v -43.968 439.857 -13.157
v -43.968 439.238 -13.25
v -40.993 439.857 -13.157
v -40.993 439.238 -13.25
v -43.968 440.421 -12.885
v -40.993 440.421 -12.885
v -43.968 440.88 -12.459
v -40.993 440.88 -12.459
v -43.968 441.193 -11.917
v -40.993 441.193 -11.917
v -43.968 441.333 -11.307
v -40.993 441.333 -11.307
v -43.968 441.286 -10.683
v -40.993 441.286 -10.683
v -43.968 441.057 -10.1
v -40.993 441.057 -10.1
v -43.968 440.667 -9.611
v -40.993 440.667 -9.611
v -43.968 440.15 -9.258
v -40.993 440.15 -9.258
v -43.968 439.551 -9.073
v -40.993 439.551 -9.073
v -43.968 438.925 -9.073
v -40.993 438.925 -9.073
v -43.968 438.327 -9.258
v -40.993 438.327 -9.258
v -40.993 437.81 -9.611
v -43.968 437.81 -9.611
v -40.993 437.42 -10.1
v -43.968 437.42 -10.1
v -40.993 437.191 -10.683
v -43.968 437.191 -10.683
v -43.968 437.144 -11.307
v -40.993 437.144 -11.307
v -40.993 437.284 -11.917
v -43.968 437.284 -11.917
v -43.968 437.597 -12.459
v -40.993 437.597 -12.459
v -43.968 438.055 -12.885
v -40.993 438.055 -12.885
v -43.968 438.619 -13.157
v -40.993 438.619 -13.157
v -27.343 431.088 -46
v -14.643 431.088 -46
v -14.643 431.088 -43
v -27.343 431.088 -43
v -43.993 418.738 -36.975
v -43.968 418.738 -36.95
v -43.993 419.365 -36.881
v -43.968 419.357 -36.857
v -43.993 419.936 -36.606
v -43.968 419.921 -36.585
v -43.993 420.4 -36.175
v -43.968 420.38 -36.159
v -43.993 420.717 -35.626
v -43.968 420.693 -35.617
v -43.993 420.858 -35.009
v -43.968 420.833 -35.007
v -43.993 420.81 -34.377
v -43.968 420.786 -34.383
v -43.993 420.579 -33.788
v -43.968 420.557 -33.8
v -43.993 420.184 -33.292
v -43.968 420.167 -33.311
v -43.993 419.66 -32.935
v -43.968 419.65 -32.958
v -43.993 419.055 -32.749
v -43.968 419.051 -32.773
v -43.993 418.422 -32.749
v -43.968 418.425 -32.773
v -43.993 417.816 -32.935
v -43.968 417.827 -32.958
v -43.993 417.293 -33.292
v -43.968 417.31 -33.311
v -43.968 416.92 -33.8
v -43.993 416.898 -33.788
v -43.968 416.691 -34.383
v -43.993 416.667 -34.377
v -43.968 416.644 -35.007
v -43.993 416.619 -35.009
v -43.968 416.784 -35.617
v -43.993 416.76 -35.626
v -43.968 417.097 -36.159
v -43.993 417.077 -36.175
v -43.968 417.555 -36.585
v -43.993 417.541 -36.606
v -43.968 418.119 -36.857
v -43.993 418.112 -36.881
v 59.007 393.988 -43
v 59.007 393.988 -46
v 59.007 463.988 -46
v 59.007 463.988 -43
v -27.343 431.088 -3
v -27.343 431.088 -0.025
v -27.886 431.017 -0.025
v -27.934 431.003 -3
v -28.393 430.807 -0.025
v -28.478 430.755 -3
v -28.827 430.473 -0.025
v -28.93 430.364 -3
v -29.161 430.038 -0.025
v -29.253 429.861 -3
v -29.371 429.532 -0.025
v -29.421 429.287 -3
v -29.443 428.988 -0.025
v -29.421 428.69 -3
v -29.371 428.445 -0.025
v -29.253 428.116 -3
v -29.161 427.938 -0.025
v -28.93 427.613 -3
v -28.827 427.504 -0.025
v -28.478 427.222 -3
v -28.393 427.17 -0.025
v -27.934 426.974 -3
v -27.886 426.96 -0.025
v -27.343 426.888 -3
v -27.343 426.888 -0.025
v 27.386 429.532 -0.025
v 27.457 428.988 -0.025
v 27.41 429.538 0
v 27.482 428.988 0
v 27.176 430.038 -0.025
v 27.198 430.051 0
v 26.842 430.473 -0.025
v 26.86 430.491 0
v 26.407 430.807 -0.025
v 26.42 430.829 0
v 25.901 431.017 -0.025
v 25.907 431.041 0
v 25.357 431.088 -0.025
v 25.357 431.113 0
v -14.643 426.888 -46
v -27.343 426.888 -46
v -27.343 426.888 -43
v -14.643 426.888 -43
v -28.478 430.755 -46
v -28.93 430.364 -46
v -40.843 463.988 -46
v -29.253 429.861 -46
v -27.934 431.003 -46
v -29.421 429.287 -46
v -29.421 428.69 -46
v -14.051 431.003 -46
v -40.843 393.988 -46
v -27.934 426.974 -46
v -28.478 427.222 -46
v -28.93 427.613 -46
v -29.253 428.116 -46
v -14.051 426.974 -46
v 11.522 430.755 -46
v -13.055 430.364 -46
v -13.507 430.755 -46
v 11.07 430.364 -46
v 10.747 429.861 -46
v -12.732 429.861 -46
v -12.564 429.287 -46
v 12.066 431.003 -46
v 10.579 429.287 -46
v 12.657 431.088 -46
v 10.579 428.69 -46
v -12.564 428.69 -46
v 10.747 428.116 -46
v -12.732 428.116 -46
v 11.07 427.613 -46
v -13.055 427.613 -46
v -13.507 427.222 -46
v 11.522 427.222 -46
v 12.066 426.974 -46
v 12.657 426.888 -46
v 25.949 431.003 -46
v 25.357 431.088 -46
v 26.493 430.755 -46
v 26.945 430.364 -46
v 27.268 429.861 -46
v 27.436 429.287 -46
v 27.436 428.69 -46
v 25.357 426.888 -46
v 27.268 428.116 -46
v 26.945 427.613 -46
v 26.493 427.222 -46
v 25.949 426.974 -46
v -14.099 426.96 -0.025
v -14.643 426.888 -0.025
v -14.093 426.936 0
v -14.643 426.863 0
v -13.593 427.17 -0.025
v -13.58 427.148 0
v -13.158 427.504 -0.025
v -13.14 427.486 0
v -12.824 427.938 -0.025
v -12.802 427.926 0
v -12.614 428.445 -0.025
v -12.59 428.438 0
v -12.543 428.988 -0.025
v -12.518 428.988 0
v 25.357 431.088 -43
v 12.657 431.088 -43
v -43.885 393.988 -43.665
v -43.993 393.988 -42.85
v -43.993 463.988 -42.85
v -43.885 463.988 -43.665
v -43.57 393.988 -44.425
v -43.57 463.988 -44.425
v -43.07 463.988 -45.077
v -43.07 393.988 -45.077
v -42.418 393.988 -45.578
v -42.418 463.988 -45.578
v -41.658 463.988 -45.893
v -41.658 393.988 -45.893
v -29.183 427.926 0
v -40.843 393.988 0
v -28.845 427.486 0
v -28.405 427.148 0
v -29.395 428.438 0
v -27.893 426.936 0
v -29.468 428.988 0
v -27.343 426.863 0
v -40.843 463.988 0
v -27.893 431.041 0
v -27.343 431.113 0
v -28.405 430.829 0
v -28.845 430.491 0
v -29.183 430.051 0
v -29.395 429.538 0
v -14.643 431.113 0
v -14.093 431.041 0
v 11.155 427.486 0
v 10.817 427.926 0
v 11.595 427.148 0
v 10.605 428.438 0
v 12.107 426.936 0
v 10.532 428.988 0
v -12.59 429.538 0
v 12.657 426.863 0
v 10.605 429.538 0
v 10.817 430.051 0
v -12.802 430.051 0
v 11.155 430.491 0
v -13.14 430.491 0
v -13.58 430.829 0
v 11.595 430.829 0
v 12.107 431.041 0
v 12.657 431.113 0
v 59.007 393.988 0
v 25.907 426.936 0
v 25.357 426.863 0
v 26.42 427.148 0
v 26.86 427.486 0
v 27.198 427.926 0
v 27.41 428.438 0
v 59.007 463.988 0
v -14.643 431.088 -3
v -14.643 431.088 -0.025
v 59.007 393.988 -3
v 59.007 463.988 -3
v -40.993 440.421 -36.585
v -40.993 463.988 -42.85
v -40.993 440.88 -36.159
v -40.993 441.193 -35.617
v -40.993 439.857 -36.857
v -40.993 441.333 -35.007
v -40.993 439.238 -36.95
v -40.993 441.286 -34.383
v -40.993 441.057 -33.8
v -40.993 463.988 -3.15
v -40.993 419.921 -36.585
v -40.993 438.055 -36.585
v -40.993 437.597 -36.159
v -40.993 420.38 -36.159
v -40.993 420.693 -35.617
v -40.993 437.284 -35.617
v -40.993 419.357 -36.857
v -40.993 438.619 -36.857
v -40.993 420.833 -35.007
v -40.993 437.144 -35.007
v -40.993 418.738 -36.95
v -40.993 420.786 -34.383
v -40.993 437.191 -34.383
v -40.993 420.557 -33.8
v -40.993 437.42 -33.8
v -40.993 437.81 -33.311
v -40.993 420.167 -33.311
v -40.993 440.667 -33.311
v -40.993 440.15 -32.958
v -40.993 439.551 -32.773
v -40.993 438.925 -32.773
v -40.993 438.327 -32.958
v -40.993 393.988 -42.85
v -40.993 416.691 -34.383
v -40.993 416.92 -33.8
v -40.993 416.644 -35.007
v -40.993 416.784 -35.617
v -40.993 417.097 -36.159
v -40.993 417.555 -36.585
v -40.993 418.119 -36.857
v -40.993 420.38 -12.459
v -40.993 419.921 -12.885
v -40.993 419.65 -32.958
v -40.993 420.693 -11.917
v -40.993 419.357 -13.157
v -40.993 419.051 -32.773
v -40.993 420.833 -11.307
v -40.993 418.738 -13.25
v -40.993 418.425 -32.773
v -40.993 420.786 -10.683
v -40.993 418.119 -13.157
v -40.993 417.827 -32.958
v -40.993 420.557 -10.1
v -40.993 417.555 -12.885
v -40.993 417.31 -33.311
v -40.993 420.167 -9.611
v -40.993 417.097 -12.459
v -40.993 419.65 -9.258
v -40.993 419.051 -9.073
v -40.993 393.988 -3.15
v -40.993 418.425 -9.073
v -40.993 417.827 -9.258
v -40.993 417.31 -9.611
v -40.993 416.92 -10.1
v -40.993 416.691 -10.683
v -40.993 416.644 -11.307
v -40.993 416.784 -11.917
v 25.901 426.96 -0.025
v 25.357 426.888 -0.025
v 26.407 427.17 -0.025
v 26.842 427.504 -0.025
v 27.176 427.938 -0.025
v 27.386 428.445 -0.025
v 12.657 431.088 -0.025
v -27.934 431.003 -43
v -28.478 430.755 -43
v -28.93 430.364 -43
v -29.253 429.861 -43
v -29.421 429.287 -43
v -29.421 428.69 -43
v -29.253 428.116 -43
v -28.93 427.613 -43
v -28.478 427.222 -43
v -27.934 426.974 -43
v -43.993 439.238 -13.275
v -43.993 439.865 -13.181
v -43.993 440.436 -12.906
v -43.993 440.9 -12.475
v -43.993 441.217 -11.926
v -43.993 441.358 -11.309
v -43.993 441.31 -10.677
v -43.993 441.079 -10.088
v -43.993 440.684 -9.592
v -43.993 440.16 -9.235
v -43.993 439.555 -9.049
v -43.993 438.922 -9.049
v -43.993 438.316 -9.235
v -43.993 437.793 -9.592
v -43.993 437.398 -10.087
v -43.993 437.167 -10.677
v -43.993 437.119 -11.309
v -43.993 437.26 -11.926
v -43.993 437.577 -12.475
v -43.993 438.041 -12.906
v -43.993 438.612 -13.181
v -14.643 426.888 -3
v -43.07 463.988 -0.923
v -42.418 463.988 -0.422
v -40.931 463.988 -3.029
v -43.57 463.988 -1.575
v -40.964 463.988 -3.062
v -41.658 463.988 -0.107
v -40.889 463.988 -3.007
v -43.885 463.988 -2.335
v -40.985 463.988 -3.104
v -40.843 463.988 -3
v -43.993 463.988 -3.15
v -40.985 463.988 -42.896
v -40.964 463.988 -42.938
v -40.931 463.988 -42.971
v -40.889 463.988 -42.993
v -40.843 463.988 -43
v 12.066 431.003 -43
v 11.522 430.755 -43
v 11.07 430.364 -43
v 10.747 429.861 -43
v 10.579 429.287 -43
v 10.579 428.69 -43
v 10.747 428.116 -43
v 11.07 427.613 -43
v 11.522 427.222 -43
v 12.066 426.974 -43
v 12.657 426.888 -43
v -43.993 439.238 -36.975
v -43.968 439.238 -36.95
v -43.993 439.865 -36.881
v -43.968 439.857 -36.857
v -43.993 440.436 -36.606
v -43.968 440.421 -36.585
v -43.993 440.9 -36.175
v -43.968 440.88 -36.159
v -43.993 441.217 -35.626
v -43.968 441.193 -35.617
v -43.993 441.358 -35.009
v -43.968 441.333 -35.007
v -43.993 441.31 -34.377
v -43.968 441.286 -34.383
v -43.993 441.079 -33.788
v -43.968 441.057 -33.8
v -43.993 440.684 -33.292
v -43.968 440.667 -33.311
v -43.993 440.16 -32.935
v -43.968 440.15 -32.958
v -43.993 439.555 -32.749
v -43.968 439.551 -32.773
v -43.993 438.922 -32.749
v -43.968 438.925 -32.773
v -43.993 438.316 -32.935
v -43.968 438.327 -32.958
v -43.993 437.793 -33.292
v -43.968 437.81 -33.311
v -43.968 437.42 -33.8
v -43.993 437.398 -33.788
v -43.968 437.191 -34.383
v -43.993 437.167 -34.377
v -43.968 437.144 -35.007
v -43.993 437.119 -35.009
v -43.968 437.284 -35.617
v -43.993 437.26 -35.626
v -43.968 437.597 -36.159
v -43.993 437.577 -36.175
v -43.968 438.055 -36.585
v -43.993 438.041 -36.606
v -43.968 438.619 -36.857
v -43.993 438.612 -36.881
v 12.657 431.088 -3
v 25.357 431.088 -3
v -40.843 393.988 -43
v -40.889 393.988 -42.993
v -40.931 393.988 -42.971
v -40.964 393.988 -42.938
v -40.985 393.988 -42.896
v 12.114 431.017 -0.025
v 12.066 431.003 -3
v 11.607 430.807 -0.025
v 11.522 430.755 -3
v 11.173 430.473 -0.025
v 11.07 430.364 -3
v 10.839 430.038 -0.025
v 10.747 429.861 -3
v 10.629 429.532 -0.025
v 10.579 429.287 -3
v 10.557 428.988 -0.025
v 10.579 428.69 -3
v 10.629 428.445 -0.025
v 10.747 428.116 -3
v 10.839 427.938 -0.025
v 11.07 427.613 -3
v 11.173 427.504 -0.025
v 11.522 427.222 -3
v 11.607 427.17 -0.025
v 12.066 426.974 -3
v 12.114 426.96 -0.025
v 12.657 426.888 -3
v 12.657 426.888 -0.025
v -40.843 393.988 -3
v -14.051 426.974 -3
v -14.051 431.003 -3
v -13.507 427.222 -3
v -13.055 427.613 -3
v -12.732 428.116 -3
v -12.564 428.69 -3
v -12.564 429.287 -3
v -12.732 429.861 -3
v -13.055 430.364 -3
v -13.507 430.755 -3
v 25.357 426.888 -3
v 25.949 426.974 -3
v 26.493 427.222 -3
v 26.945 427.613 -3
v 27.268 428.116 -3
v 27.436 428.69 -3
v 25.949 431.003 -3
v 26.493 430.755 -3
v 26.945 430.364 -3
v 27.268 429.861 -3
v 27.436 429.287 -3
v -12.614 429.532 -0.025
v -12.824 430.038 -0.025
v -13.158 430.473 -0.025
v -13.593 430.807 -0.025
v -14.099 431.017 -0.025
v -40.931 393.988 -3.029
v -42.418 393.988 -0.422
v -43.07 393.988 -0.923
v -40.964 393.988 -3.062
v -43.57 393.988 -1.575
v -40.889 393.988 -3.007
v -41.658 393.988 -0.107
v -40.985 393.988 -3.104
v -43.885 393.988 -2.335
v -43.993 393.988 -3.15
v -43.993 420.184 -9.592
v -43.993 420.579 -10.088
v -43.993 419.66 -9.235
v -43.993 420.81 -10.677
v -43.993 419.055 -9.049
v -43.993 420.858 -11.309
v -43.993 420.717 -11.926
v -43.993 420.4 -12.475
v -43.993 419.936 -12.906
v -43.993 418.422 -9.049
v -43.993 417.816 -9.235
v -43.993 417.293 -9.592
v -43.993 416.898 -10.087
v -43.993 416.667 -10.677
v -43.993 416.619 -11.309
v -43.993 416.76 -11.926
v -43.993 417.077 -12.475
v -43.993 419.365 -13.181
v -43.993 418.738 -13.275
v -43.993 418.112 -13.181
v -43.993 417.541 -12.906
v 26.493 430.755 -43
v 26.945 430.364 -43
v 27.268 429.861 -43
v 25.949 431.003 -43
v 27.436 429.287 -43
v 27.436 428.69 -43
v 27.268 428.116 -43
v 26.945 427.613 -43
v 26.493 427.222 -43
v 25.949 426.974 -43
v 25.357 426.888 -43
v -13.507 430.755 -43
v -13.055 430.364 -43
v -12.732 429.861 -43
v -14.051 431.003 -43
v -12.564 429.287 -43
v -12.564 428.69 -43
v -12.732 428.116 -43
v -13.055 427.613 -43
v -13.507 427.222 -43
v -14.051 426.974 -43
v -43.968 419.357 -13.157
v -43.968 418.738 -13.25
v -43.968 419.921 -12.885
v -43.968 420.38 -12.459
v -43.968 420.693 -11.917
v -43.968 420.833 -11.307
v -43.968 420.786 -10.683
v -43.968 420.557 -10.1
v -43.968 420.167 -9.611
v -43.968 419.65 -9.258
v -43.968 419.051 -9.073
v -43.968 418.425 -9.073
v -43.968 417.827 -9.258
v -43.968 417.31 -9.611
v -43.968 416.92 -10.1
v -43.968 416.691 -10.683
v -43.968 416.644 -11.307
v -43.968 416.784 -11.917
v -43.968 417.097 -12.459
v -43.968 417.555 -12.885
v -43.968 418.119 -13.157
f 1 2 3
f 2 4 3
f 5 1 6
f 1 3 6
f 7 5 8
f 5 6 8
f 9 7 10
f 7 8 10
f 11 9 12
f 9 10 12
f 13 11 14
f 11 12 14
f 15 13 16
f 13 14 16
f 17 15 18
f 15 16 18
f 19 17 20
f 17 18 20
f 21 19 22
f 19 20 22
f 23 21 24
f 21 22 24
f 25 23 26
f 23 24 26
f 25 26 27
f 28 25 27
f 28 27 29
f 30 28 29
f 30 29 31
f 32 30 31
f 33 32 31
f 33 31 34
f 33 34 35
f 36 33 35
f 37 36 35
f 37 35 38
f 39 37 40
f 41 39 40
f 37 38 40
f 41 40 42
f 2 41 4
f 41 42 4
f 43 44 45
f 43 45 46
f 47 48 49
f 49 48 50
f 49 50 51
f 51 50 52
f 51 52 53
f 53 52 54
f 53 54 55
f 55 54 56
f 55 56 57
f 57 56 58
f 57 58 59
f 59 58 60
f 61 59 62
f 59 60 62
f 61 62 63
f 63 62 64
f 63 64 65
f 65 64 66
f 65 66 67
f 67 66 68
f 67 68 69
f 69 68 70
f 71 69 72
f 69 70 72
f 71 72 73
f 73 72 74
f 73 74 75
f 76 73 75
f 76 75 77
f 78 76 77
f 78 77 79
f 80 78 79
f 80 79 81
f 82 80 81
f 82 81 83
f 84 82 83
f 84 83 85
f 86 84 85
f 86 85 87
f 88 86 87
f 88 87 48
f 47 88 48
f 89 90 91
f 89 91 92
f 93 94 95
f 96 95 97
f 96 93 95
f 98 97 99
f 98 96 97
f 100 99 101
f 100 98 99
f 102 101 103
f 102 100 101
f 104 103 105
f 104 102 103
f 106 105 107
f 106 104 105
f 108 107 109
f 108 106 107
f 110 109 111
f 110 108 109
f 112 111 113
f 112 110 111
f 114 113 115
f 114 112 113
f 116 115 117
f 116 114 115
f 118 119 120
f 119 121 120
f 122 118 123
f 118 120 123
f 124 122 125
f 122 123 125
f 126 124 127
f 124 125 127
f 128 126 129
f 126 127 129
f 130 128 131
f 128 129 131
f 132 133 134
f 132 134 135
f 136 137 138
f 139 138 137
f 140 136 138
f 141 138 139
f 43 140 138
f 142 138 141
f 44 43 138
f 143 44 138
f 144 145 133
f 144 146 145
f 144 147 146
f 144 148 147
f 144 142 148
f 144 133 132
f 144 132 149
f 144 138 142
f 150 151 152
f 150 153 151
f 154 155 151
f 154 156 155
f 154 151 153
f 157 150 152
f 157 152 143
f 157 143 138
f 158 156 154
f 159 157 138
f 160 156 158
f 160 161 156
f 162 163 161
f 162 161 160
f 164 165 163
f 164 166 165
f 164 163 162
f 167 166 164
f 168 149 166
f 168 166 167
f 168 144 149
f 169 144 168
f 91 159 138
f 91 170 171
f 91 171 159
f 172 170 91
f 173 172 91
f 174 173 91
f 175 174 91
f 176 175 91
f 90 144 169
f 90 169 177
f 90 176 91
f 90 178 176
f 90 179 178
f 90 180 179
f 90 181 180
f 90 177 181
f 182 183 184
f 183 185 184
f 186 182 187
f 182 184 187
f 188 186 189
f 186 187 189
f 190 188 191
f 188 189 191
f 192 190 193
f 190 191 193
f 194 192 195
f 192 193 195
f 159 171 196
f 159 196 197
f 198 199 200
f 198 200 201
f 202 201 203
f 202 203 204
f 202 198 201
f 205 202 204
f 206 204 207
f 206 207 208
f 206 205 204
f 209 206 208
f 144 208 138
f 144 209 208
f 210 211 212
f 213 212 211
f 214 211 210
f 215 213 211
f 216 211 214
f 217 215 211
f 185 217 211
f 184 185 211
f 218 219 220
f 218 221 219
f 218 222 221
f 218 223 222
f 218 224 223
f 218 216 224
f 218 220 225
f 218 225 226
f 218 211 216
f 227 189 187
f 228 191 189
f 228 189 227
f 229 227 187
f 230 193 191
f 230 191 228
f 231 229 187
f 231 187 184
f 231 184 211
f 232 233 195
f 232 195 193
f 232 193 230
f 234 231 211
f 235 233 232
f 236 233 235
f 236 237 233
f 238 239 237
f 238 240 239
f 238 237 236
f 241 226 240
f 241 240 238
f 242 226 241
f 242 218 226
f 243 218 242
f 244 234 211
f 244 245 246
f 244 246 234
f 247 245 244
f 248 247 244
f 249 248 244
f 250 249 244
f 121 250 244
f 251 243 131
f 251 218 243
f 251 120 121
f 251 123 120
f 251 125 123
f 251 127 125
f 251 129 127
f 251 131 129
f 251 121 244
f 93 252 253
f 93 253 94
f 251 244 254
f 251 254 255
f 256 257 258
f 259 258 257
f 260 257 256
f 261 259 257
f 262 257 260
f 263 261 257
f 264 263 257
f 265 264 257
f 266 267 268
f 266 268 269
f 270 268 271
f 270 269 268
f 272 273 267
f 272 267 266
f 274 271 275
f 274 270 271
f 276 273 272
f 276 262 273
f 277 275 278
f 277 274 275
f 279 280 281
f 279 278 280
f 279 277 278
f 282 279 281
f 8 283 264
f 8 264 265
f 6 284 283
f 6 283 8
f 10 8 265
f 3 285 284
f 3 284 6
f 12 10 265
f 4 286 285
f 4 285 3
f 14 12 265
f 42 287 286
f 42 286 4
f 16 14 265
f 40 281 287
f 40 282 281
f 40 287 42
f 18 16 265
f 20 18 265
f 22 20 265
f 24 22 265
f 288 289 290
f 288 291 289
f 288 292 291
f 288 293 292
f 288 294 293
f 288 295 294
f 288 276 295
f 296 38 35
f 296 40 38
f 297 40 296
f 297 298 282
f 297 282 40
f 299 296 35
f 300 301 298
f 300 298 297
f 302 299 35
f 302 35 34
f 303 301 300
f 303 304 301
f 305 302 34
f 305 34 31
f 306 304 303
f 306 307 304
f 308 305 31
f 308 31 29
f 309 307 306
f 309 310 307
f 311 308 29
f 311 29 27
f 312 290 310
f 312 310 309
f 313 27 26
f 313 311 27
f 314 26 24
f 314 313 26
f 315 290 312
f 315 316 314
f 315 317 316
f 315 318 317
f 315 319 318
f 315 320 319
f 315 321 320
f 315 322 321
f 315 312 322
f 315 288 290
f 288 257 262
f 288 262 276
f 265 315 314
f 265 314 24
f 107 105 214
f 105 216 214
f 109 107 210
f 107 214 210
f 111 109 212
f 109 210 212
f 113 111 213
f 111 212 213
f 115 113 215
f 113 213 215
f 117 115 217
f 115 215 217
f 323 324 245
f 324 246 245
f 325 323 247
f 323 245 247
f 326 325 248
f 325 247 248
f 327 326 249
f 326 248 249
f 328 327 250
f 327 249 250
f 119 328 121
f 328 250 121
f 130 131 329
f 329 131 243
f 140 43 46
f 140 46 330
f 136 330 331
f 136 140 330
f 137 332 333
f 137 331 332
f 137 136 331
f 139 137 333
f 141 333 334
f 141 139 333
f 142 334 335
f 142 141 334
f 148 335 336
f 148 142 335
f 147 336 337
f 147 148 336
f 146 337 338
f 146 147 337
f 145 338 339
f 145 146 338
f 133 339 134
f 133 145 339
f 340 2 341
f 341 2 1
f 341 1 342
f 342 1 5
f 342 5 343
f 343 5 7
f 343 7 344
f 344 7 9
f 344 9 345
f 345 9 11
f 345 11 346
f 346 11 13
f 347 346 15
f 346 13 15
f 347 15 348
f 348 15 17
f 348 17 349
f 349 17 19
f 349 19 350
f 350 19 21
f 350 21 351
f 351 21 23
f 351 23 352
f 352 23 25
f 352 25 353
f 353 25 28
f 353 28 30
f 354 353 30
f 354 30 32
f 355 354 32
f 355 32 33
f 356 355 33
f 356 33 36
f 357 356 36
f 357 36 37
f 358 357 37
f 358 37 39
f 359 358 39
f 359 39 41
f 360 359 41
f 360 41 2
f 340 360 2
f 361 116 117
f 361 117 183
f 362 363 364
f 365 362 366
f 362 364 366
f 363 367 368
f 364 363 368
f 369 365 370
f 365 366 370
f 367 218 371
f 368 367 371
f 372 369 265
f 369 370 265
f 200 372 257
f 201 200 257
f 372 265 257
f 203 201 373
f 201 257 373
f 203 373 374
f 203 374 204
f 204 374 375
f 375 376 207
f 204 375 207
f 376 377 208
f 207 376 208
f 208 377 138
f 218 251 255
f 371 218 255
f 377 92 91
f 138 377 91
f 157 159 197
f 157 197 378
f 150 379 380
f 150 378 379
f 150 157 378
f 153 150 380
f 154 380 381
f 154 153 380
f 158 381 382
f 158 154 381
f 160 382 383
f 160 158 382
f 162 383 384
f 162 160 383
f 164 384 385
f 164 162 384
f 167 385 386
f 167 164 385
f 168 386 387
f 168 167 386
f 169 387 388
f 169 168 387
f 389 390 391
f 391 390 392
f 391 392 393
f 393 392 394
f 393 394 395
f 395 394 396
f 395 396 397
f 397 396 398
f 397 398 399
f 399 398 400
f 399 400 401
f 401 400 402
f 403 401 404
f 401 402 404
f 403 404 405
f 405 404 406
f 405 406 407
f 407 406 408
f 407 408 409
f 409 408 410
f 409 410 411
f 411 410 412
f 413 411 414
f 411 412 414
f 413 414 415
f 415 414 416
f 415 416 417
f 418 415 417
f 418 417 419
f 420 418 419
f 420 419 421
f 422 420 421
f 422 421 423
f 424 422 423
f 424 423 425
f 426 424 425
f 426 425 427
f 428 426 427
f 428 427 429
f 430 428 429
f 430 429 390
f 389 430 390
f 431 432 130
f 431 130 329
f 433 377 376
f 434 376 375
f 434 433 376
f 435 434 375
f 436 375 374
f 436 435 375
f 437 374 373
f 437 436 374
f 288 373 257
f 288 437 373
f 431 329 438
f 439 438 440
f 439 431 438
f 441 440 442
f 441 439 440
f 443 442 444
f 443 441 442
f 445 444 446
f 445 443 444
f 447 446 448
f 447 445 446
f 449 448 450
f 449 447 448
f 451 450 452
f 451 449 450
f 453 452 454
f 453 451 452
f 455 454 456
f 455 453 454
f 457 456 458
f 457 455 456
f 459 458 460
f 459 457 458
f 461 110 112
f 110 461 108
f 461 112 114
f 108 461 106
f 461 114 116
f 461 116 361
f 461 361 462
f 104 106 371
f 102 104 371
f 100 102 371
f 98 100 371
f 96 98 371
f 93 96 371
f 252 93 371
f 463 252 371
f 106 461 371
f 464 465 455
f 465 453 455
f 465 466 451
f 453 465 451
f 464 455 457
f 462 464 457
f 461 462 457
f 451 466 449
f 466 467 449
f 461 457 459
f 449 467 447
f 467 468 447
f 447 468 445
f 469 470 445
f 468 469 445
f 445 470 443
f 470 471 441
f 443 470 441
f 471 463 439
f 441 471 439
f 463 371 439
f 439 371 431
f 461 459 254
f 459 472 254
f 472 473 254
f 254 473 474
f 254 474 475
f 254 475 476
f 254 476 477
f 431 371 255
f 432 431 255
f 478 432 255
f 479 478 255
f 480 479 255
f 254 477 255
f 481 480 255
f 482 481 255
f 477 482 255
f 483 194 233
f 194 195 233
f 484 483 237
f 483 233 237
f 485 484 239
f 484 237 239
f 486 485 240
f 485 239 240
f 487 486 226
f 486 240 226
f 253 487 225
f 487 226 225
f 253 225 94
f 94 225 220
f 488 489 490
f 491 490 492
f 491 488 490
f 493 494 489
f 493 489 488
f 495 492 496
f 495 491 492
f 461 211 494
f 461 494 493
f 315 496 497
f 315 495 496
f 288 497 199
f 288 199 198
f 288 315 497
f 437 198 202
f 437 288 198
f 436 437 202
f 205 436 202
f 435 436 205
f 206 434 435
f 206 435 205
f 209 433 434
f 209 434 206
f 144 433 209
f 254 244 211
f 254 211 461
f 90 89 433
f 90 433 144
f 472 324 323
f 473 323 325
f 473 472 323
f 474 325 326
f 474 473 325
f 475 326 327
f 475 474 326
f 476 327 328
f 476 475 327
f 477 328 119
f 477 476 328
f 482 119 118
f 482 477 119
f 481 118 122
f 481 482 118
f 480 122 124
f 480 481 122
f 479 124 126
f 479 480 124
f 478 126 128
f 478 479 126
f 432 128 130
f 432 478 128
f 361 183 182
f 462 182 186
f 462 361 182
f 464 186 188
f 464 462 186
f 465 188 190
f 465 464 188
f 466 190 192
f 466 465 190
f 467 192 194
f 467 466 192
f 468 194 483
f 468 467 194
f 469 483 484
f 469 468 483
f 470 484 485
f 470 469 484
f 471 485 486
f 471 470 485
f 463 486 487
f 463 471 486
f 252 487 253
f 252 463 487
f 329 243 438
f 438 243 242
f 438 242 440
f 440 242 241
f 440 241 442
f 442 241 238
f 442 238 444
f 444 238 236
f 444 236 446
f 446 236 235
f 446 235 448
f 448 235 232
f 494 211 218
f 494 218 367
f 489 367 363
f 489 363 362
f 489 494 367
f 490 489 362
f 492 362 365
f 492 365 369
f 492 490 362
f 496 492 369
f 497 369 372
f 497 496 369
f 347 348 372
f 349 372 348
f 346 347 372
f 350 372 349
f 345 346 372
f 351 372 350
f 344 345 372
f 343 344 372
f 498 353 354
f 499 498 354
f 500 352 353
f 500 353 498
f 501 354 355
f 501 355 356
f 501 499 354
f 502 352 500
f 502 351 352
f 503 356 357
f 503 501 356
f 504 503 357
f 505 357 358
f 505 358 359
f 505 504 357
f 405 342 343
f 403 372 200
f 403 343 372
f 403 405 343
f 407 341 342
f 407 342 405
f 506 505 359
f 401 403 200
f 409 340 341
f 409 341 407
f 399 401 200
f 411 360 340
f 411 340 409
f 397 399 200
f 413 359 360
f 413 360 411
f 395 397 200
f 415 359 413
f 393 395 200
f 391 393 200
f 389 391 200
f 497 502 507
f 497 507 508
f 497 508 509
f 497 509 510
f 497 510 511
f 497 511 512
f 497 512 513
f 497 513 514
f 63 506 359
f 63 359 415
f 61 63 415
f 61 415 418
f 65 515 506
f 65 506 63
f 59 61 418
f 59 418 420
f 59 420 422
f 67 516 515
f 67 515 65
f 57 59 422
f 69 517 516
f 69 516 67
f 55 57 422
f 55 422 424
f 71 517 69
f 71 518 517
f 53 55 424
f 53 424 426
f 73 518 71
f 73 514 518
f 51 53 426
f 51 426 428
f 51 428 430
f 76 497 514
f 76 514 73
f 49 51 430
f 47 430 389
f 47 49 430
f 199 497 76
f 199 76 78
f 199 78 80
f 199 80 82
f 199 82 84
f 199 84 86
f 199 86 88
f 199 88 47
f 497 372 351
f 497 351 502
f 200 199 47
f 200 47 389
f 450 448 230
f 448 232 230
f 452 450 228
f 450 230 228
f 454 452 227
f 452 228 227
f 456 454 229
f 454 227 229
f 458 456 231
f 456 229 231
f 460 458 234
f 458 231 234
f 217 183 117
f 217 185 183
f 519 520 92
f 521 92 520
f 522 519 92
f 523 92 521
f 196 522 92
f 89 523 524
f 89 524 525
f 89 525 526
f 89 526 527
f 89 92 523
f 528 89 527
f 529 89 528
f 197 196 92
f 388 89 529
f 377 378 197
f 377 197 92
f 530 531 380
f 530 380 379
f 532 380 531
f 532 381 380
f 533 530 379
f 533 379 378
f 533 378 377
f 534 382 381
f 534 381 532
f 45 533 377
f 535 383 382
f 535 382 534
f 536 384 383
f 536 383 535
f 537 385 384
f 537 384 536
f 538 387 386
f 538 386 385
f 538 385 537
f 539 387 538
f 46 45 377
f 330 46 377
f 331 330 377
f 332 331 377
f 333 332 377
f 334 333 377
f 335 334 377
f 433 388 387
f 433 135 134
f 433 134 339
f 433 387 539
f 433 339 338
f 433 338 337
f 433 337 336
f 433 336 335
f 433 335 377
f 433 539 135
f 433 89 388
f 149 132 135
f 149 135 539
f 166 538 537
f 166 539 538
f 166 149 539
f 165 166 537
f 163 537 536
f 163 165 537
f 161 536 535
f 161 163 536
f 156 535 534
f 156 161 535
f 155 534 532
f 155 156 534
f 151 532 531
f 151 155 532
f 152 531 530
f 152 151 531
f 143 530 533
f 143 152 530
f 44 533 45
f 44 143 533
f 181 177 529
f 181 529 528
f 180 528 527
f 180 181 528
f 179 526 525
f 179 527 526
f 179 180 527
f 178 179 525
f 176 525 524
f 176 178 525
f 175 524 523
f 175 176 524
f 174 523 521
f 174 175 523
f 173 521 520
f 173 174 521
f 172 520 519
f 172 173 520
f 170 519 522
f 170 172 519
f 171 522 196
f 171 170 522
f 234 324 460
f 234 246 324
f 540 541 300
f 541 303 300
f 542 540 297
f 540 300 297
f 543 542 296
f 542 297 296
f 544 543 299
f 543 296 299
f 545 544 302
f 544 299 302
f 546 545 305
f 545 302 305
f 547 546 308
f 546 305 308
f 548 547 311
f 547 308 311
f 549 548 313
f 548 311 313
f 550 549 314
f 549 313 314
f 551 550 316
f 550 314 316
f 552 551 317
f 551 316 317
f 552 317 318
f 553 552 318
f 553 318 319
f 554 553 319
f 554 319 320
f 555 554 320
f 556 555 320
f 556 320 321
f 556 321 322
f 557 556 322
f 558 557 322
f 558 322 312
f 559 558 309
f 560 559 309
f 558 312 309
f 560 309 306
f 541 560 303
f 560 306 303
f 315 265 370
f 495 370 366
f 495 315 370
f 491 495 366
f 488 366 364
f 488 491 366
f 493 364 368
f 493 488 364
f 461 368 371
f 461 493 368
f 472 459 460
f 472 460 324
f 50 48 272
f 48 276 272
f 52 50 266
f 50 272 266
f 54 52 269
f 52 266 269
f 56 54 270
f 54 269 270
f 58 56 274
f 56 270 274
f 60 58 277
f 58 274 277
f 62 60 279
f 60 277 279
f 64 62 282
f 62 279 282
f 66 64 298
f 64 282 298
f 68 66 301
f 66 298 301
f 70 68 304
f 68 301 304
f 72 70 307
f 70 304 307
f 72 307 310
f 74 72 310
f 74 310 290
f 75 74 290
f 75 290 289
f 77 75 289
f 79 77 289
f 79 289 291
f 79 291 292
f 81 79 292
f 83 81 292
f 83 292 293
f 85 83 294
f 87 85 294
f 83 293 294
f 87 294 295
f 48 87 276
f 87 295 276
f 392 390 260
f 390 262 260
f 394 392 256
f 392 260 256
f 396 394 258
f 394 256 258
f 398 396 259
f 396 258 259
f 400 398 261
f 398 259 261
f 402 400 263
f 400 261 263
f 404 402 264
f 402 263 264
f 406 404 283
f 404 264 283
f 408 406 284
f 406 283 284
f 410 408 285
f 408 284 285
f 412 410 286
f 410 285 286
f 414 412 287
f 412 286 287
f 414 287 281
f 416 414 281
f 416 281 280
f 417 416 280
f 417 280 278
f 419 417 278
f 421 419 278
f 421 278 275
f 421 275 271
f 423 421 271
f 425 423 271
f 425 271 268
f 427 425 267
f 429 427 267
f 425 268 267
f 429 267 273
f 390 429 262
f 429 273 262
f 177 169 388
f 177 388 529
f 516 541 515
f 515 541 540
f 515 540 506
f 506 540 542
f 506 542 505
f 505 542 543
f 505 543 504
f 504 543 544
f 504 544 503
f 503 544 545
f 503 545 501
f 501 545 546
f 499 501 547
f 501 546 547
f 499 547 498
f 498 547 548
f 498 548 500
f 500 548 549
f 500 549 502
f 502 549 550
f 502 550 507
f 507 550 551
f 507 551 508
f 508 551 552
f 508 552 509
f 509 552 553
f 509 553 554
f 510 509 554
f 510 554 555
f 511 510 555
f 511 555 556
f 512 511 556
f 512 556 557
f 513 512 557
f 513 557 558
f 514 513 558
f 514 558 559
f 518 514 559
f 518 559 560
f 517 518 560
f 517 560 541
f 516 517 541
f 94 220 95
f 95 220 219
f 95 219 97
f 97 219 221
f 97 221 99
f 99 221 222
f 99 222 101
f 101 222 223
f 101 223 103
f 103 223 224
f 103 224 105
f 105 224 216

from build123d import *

# Parameters (mm, degrees)
SKETCH1_W                         = 100
SKETCH1_H                         = 70
BASE_FLANGE1_DEPTH                = 3
EDGE_FLANGE1_STRIP_W              = 12.3
EDGE_FLANGE1_STRIP_H              = 3
EDGE_FLANGE1_STRIP_CUT_DEPTH      = 70
EDGE_FLANGE1_DEPTH                = 70
EDGE_FLANGE3_STRIP_W              = 12.3
EDGE_FLANGE3_STRIP_H              = 3
EDGE_FLANGE3_STRIP_CUT_DEPTH      = 70
EDGE_FLANGE3_DEPTH                = 70
TAP_START                         = -47
TAP_DRILL_SLOT_FOR_M5_TAP3_DEPTH  = 48
TAP_DRILL_FOR_M5_TAP1_D           = 4.2
TAP_DRILL_FOR_M5_TAP1_CSINK_D     = 4.25
TAP_DRILL_FOR_M5_TAP1_CSINK_ANGLE = 90


with BuildPart() as part:
    # Base-Flange1: sheet metal written as solids
    # Sketch1 → Base-Flange1 (new body)
    with BuildSketch(Plane.XY):
        with Locations((9.007487246, 428.98845549)):
            Rectangle(SKETCH1_W, SKETCH1_H)
    extrude(amount=-BASE_FLANGE1_DEPTH)

    # Edge-Flange1: sheet metal written as solids
    # Edge-Flange1 strip (on a plane across the edge) → Edge-Flange1 strip cut (cut)
    with BuildSketch(Plane(origin=(-40.992512754, 393.98845549, -3), x_dir=(1, 0, 0), z_dir=(0, 1, 0))):
        with Locations((-6, -1.5)):
            Rectangle(EDGE_FLANGE1_STRIP_W, EDGE_FLANGE1_STRIP_H)
    extrude(amount=EDGE_FLANGE1_STRIP_CUT_DEPTH, mode=Mode.SUBTRACT)

    # Edge-Flange1 section (on a plane across the edge) → Edge-Flange1 (add)
    with BuildSketch(Plane(origin=(-40.992512754, 393.98845549, -3), x_dir=(1, 0, 0), z_dir=(0, 1, 0))):
        with BuildLine():
            Line((-3, 0.15), (-3, 40))
            Line((-3, 40), (0, 40))
            Line((0, 40), (0, 0.15))
            ThreePointArc((0, 0.15), (0.043933983, 0.043933983), (0.15, 0))
            Line((0.15, 0), (0.15, -3))
            ThreePointArc((0.15, -3), (-2.077386361, -2.077386361), (-3, 0.15))
        make_face()
    extrude(amount=EDGE_FLANGE1_DEPTH)

    # Edge-Flange3: sheet metal written as solids
    # Edge-Flange3 strip (on a plane across the edge) → Edge-Flange3 strip cut (cut)
    with BuildSketch(Plane(origin=(-40.992512754, 393.98845549, -43), x_dir=(0, 0, 1), z_dir=(0, 1, 0))):
        with Locations((-6, -1.5)):
            Rectangle(EDGE_FLANGE3_STRIP_W, EDGE_FLANGE3_STRIP_H)
    extrude(amount=EDGE_FLANGE3_STRIP_CUT_DEPTH, mode=Mode.SUBTRACT)

    # Edge-Flange3 section (on a plane across the edge) → Edge-Flange3 (add)
    with BuildSketch(Plane(origin=(-40.992512754, 393.98845549, -43), x_dir=(0, 0, 1), z_dir=(0, 1, 0))):
        with BuildLine():
            Line((-3, 0.15), (-3, 100))
            Line((-3, 100), (0, 100))
            Line((0, 100), (0, 0.15))
            ThreePointArc((0, 0.15), (0.043933983, 0.043933983), (0.15, 0))
            Line((0.15, 0), (0.15, -3))
            ThreePointArc((0.15, -3), (-2.077386361, -2.077386361), (-3, 0.15))
        make_face()
    extrude(amount=EDGE_FLANGE3_DEPTH)

    # Tap Drill Slot for M5 Tap3: read off the stored shape, not the designer's step
    # Tap Drill Slot for M5 Tap3 outline → Tap Drill Slot for M5 Tap3 (cut)
    with BuildSketch(Plane.XY.offset(TAP_START)):
        with BuildLine():
            ThreePointArc((12.657487246, 431.08845549), (10.557487246, 428.98845549), (12.657487246, 426.88845549))
            Line((12.657487246, 426.88845549), (25.357487246, 426.88845549))
            ThreePointArc((25.357487246, 426.88845549), (27.457487246, 428.98845549), (25.357487246, 431.08845549))
            Line((25.357487246, 431.08845549), (12.657487246, 431.08845549))
        make_face()
        with BuildLine():
            ThreePointArc((-27.342512754, 431.08845549), (-29.442512754, 428.98845549), (-27.342512754, 426.88845549))
            Line((-27.342512754, 426.88845549), (-14.642512754, 426.88845549))
            ThreePointArc((-14.642512754, 426.88845549), (-12.542512754, 428.98845549), (-14.642512754, 431.08845549))
            Line((-14.642512754, 431.08845549), (-27.342512754, 431.08845549))
        make_face()
    extrude(amount=TAP_DRILL_SLOT_FOR_M5_TAP3_DEPTH, mode=Mode.SUBTRACT)

    # Tap Drill Slot for M5 Tap3 2: loft between two sections, ruled curve by curve
    tap_drill_slot_for_m5_tap3_2_from = [
        Edge.make_three_point_arc((25.357487246, 426.88845549, -0.025), (26.842411487, 427.503531249, -0.025), (27.457487246, 428.98845549, -0.025)),
        Edge.make_three_point_arc((27.457487246, 428.98845549, -0.025), (26.842411487, 430.47337973, -0.025), (25.357487246, 431.08845549, -0.025)),
        Edge.make_three_point_arc((12.657487246, 431.08845549, -0.025), (11.172563006, 430.47337973, -0.025), (10.557487246, 428.98845549, -0.025)),
        Edge.make_three_point_arc((10.557487246, 428.98845549, -0.025), (11.172563006, 427.503531249, -0.025), (12.657487246, 426.88845549, -0.025)),
        Edge.make_line((25.357487246, 431.08845549, -0.025), (12.657487246, 431.08845549, -0.025)),
        Edge.make_line((25.357487246, 426.88845549, -0.025), (12.657487246, 426.88845549, -0.025)),
    ]
    tap_drill_slot_for_m5_tap3_2_to = [
        Edge.make_three_point_arc((25.357487246, 426.86345549, 0), (26.860089156, 427.48585358, 0), (27.482487246, 428.98845549, 0)),
        Edge.make_three_point_arc((27.482487246, 428.98845549, 0), (26.860089156, 430.4910574, 0), (25.357487246, 431.11345549, 0)),
        Edge.make_three_point_arc((12.657487246, 431.11345549, 0), (11.154885336, 430.4910574, 0), (10.532487246, 428.98845549, 0)),
        Edge.make_three_point_arc((10.532487246, 428.98845549, 0), (11.154885336, 427.48585358, 0), (12.657487246, 426.86345549, 0)),
        Edge.make_line((25.357487246, 431.11345549, 0), (12.657487246, 431.11345549, 0)),
        Edge.make_line((25.357487246, 426.86345549, 0), (12.657487246, 426.86345549, 0)),
    ]
    tap_drill_slot_for_m5_tap3_2 = Solid(Shell([*[Face.make_surface_from_curves(tap_drill_slot_for_m5_tap3_2_from[k], tap_drill_slot_for_m5_tap3_2_to[k]) for k in range(6)], Face(Wire(tap_drill_slot_for_m5_tap3_2_from)), Face(Wire(tap_drill_slot_for_m5_tap3_2_to))]))
    add(tap_drill_slot_for_m5_tap3_2, mode=Mode.SUBTRACT)

    # Tap Drill Slot for M5 Tap3 3: loft between two sections, ruled curve by curve
    tap_drill_slot_for_m5_tap3_3_from = [
        Edge.make_three_point_arc((-14.642512754, 426.88845549, -0.025), (-13.157588513, 427.503531249, -0.025), (-12.542512754, 428.98845549, -0.025)),
        Edge.make_three_point_arc((-12.542512754, 428.98845549, -0.025), (-13.157588513, 430.47337973, -0.025), (-14.642512754, 431.08845549, -0.025)),
        Edge.make_three_point_arc((-27.342512754, 431.08845549, -0.025), (-28.827436994, 430.47337973, -0.025), (-29.442512754, 428.98845549, -0.025)),
        Edge.make_three_point_arc((-29.442512754, 428.98845549, -0.025), (-28.827436994, 427.503531249, -0.025), (-27.342512754, 426.88845549, -0.025)),
        Edge.make_line((-14.642512754, 431.08845549, -0.025), (-27.342512754, 431.08845549, -0.025)),
        Edge.make_line((-14.642512754, 426.88845549, -0.025), (-27.342512754, 426.88845549, -0.025)),
    ]
    tap_drill_slot_for_m5_tap3_3_to = [
        Edge.make_three_point_arc((-14.642512754, 426.86345549, 0), (-13.139910844, 427.48585358, 0), (-12.517512754, 428.98845549, 0)),
        Edge.make_three_point_arc((-12.517512754, 428.98845549, 0), (-13.139910844, 430.4910574, 0), (-14.642512754, 431.11345549, 0)),
        Edge.make_three_point_arc((-27.342512754, 431.11345549, 0), (-28.845114664, 430.4910574, 0), (-29.467512754, 428.98845549, 0)),
        Edge.make_three_point_arc((-29.467512754, 428.98845549, 0), (-28.845114664, 427.48585358, 0), (-27.342512754, 426.86345549, 0)),
        Edge.make_line((-14.642512754, 431.11345549, 0), (-27.342512754, 431.11345549, 0)),
        Edge.make_line((-14.642512754, 426.86345549, 0), (-27.342512754, 426.86345549, 0)),
    ]
    tap_drill_slot_for_m5_tap3_3 = Solid(Shell([*[Face.make_surface_from_curves(tap_drill_slot_for_m5_tap3_3_from[k], tap_drill_slot_for_m5_tap3_3_to[k]) for k in range(6)], Face(Wire(tap_drill_slot_for_m5_tap3_3_from)), Face(Wire(tap_drill_slot_for_m5_tap3_3_to))]))
    add(tap_drill_slot_for_m5_tap3_3, mode=Mode.SUBTRACT)

    # Tap Drill for M5 Tap1 (through all)
    with Locations(Plane.ZY.offset(43.992512754)):
        with Locations((-34.85, 439.23845549), (-11.15, 439.23845549), (-11.15, 418.73845549), (-34.85, 418.73845549)):
            CounterSinkHole(TAP_DRILL_FOR_M5_TAP1_D / 2, TAP_DRILL_FOR_M5_TAP1_CSINK_D / 2, counter_sink_angle=TAP_DRILL_FOR_M5_TAP1_CSINK_ANGLE)


solid = part.part
